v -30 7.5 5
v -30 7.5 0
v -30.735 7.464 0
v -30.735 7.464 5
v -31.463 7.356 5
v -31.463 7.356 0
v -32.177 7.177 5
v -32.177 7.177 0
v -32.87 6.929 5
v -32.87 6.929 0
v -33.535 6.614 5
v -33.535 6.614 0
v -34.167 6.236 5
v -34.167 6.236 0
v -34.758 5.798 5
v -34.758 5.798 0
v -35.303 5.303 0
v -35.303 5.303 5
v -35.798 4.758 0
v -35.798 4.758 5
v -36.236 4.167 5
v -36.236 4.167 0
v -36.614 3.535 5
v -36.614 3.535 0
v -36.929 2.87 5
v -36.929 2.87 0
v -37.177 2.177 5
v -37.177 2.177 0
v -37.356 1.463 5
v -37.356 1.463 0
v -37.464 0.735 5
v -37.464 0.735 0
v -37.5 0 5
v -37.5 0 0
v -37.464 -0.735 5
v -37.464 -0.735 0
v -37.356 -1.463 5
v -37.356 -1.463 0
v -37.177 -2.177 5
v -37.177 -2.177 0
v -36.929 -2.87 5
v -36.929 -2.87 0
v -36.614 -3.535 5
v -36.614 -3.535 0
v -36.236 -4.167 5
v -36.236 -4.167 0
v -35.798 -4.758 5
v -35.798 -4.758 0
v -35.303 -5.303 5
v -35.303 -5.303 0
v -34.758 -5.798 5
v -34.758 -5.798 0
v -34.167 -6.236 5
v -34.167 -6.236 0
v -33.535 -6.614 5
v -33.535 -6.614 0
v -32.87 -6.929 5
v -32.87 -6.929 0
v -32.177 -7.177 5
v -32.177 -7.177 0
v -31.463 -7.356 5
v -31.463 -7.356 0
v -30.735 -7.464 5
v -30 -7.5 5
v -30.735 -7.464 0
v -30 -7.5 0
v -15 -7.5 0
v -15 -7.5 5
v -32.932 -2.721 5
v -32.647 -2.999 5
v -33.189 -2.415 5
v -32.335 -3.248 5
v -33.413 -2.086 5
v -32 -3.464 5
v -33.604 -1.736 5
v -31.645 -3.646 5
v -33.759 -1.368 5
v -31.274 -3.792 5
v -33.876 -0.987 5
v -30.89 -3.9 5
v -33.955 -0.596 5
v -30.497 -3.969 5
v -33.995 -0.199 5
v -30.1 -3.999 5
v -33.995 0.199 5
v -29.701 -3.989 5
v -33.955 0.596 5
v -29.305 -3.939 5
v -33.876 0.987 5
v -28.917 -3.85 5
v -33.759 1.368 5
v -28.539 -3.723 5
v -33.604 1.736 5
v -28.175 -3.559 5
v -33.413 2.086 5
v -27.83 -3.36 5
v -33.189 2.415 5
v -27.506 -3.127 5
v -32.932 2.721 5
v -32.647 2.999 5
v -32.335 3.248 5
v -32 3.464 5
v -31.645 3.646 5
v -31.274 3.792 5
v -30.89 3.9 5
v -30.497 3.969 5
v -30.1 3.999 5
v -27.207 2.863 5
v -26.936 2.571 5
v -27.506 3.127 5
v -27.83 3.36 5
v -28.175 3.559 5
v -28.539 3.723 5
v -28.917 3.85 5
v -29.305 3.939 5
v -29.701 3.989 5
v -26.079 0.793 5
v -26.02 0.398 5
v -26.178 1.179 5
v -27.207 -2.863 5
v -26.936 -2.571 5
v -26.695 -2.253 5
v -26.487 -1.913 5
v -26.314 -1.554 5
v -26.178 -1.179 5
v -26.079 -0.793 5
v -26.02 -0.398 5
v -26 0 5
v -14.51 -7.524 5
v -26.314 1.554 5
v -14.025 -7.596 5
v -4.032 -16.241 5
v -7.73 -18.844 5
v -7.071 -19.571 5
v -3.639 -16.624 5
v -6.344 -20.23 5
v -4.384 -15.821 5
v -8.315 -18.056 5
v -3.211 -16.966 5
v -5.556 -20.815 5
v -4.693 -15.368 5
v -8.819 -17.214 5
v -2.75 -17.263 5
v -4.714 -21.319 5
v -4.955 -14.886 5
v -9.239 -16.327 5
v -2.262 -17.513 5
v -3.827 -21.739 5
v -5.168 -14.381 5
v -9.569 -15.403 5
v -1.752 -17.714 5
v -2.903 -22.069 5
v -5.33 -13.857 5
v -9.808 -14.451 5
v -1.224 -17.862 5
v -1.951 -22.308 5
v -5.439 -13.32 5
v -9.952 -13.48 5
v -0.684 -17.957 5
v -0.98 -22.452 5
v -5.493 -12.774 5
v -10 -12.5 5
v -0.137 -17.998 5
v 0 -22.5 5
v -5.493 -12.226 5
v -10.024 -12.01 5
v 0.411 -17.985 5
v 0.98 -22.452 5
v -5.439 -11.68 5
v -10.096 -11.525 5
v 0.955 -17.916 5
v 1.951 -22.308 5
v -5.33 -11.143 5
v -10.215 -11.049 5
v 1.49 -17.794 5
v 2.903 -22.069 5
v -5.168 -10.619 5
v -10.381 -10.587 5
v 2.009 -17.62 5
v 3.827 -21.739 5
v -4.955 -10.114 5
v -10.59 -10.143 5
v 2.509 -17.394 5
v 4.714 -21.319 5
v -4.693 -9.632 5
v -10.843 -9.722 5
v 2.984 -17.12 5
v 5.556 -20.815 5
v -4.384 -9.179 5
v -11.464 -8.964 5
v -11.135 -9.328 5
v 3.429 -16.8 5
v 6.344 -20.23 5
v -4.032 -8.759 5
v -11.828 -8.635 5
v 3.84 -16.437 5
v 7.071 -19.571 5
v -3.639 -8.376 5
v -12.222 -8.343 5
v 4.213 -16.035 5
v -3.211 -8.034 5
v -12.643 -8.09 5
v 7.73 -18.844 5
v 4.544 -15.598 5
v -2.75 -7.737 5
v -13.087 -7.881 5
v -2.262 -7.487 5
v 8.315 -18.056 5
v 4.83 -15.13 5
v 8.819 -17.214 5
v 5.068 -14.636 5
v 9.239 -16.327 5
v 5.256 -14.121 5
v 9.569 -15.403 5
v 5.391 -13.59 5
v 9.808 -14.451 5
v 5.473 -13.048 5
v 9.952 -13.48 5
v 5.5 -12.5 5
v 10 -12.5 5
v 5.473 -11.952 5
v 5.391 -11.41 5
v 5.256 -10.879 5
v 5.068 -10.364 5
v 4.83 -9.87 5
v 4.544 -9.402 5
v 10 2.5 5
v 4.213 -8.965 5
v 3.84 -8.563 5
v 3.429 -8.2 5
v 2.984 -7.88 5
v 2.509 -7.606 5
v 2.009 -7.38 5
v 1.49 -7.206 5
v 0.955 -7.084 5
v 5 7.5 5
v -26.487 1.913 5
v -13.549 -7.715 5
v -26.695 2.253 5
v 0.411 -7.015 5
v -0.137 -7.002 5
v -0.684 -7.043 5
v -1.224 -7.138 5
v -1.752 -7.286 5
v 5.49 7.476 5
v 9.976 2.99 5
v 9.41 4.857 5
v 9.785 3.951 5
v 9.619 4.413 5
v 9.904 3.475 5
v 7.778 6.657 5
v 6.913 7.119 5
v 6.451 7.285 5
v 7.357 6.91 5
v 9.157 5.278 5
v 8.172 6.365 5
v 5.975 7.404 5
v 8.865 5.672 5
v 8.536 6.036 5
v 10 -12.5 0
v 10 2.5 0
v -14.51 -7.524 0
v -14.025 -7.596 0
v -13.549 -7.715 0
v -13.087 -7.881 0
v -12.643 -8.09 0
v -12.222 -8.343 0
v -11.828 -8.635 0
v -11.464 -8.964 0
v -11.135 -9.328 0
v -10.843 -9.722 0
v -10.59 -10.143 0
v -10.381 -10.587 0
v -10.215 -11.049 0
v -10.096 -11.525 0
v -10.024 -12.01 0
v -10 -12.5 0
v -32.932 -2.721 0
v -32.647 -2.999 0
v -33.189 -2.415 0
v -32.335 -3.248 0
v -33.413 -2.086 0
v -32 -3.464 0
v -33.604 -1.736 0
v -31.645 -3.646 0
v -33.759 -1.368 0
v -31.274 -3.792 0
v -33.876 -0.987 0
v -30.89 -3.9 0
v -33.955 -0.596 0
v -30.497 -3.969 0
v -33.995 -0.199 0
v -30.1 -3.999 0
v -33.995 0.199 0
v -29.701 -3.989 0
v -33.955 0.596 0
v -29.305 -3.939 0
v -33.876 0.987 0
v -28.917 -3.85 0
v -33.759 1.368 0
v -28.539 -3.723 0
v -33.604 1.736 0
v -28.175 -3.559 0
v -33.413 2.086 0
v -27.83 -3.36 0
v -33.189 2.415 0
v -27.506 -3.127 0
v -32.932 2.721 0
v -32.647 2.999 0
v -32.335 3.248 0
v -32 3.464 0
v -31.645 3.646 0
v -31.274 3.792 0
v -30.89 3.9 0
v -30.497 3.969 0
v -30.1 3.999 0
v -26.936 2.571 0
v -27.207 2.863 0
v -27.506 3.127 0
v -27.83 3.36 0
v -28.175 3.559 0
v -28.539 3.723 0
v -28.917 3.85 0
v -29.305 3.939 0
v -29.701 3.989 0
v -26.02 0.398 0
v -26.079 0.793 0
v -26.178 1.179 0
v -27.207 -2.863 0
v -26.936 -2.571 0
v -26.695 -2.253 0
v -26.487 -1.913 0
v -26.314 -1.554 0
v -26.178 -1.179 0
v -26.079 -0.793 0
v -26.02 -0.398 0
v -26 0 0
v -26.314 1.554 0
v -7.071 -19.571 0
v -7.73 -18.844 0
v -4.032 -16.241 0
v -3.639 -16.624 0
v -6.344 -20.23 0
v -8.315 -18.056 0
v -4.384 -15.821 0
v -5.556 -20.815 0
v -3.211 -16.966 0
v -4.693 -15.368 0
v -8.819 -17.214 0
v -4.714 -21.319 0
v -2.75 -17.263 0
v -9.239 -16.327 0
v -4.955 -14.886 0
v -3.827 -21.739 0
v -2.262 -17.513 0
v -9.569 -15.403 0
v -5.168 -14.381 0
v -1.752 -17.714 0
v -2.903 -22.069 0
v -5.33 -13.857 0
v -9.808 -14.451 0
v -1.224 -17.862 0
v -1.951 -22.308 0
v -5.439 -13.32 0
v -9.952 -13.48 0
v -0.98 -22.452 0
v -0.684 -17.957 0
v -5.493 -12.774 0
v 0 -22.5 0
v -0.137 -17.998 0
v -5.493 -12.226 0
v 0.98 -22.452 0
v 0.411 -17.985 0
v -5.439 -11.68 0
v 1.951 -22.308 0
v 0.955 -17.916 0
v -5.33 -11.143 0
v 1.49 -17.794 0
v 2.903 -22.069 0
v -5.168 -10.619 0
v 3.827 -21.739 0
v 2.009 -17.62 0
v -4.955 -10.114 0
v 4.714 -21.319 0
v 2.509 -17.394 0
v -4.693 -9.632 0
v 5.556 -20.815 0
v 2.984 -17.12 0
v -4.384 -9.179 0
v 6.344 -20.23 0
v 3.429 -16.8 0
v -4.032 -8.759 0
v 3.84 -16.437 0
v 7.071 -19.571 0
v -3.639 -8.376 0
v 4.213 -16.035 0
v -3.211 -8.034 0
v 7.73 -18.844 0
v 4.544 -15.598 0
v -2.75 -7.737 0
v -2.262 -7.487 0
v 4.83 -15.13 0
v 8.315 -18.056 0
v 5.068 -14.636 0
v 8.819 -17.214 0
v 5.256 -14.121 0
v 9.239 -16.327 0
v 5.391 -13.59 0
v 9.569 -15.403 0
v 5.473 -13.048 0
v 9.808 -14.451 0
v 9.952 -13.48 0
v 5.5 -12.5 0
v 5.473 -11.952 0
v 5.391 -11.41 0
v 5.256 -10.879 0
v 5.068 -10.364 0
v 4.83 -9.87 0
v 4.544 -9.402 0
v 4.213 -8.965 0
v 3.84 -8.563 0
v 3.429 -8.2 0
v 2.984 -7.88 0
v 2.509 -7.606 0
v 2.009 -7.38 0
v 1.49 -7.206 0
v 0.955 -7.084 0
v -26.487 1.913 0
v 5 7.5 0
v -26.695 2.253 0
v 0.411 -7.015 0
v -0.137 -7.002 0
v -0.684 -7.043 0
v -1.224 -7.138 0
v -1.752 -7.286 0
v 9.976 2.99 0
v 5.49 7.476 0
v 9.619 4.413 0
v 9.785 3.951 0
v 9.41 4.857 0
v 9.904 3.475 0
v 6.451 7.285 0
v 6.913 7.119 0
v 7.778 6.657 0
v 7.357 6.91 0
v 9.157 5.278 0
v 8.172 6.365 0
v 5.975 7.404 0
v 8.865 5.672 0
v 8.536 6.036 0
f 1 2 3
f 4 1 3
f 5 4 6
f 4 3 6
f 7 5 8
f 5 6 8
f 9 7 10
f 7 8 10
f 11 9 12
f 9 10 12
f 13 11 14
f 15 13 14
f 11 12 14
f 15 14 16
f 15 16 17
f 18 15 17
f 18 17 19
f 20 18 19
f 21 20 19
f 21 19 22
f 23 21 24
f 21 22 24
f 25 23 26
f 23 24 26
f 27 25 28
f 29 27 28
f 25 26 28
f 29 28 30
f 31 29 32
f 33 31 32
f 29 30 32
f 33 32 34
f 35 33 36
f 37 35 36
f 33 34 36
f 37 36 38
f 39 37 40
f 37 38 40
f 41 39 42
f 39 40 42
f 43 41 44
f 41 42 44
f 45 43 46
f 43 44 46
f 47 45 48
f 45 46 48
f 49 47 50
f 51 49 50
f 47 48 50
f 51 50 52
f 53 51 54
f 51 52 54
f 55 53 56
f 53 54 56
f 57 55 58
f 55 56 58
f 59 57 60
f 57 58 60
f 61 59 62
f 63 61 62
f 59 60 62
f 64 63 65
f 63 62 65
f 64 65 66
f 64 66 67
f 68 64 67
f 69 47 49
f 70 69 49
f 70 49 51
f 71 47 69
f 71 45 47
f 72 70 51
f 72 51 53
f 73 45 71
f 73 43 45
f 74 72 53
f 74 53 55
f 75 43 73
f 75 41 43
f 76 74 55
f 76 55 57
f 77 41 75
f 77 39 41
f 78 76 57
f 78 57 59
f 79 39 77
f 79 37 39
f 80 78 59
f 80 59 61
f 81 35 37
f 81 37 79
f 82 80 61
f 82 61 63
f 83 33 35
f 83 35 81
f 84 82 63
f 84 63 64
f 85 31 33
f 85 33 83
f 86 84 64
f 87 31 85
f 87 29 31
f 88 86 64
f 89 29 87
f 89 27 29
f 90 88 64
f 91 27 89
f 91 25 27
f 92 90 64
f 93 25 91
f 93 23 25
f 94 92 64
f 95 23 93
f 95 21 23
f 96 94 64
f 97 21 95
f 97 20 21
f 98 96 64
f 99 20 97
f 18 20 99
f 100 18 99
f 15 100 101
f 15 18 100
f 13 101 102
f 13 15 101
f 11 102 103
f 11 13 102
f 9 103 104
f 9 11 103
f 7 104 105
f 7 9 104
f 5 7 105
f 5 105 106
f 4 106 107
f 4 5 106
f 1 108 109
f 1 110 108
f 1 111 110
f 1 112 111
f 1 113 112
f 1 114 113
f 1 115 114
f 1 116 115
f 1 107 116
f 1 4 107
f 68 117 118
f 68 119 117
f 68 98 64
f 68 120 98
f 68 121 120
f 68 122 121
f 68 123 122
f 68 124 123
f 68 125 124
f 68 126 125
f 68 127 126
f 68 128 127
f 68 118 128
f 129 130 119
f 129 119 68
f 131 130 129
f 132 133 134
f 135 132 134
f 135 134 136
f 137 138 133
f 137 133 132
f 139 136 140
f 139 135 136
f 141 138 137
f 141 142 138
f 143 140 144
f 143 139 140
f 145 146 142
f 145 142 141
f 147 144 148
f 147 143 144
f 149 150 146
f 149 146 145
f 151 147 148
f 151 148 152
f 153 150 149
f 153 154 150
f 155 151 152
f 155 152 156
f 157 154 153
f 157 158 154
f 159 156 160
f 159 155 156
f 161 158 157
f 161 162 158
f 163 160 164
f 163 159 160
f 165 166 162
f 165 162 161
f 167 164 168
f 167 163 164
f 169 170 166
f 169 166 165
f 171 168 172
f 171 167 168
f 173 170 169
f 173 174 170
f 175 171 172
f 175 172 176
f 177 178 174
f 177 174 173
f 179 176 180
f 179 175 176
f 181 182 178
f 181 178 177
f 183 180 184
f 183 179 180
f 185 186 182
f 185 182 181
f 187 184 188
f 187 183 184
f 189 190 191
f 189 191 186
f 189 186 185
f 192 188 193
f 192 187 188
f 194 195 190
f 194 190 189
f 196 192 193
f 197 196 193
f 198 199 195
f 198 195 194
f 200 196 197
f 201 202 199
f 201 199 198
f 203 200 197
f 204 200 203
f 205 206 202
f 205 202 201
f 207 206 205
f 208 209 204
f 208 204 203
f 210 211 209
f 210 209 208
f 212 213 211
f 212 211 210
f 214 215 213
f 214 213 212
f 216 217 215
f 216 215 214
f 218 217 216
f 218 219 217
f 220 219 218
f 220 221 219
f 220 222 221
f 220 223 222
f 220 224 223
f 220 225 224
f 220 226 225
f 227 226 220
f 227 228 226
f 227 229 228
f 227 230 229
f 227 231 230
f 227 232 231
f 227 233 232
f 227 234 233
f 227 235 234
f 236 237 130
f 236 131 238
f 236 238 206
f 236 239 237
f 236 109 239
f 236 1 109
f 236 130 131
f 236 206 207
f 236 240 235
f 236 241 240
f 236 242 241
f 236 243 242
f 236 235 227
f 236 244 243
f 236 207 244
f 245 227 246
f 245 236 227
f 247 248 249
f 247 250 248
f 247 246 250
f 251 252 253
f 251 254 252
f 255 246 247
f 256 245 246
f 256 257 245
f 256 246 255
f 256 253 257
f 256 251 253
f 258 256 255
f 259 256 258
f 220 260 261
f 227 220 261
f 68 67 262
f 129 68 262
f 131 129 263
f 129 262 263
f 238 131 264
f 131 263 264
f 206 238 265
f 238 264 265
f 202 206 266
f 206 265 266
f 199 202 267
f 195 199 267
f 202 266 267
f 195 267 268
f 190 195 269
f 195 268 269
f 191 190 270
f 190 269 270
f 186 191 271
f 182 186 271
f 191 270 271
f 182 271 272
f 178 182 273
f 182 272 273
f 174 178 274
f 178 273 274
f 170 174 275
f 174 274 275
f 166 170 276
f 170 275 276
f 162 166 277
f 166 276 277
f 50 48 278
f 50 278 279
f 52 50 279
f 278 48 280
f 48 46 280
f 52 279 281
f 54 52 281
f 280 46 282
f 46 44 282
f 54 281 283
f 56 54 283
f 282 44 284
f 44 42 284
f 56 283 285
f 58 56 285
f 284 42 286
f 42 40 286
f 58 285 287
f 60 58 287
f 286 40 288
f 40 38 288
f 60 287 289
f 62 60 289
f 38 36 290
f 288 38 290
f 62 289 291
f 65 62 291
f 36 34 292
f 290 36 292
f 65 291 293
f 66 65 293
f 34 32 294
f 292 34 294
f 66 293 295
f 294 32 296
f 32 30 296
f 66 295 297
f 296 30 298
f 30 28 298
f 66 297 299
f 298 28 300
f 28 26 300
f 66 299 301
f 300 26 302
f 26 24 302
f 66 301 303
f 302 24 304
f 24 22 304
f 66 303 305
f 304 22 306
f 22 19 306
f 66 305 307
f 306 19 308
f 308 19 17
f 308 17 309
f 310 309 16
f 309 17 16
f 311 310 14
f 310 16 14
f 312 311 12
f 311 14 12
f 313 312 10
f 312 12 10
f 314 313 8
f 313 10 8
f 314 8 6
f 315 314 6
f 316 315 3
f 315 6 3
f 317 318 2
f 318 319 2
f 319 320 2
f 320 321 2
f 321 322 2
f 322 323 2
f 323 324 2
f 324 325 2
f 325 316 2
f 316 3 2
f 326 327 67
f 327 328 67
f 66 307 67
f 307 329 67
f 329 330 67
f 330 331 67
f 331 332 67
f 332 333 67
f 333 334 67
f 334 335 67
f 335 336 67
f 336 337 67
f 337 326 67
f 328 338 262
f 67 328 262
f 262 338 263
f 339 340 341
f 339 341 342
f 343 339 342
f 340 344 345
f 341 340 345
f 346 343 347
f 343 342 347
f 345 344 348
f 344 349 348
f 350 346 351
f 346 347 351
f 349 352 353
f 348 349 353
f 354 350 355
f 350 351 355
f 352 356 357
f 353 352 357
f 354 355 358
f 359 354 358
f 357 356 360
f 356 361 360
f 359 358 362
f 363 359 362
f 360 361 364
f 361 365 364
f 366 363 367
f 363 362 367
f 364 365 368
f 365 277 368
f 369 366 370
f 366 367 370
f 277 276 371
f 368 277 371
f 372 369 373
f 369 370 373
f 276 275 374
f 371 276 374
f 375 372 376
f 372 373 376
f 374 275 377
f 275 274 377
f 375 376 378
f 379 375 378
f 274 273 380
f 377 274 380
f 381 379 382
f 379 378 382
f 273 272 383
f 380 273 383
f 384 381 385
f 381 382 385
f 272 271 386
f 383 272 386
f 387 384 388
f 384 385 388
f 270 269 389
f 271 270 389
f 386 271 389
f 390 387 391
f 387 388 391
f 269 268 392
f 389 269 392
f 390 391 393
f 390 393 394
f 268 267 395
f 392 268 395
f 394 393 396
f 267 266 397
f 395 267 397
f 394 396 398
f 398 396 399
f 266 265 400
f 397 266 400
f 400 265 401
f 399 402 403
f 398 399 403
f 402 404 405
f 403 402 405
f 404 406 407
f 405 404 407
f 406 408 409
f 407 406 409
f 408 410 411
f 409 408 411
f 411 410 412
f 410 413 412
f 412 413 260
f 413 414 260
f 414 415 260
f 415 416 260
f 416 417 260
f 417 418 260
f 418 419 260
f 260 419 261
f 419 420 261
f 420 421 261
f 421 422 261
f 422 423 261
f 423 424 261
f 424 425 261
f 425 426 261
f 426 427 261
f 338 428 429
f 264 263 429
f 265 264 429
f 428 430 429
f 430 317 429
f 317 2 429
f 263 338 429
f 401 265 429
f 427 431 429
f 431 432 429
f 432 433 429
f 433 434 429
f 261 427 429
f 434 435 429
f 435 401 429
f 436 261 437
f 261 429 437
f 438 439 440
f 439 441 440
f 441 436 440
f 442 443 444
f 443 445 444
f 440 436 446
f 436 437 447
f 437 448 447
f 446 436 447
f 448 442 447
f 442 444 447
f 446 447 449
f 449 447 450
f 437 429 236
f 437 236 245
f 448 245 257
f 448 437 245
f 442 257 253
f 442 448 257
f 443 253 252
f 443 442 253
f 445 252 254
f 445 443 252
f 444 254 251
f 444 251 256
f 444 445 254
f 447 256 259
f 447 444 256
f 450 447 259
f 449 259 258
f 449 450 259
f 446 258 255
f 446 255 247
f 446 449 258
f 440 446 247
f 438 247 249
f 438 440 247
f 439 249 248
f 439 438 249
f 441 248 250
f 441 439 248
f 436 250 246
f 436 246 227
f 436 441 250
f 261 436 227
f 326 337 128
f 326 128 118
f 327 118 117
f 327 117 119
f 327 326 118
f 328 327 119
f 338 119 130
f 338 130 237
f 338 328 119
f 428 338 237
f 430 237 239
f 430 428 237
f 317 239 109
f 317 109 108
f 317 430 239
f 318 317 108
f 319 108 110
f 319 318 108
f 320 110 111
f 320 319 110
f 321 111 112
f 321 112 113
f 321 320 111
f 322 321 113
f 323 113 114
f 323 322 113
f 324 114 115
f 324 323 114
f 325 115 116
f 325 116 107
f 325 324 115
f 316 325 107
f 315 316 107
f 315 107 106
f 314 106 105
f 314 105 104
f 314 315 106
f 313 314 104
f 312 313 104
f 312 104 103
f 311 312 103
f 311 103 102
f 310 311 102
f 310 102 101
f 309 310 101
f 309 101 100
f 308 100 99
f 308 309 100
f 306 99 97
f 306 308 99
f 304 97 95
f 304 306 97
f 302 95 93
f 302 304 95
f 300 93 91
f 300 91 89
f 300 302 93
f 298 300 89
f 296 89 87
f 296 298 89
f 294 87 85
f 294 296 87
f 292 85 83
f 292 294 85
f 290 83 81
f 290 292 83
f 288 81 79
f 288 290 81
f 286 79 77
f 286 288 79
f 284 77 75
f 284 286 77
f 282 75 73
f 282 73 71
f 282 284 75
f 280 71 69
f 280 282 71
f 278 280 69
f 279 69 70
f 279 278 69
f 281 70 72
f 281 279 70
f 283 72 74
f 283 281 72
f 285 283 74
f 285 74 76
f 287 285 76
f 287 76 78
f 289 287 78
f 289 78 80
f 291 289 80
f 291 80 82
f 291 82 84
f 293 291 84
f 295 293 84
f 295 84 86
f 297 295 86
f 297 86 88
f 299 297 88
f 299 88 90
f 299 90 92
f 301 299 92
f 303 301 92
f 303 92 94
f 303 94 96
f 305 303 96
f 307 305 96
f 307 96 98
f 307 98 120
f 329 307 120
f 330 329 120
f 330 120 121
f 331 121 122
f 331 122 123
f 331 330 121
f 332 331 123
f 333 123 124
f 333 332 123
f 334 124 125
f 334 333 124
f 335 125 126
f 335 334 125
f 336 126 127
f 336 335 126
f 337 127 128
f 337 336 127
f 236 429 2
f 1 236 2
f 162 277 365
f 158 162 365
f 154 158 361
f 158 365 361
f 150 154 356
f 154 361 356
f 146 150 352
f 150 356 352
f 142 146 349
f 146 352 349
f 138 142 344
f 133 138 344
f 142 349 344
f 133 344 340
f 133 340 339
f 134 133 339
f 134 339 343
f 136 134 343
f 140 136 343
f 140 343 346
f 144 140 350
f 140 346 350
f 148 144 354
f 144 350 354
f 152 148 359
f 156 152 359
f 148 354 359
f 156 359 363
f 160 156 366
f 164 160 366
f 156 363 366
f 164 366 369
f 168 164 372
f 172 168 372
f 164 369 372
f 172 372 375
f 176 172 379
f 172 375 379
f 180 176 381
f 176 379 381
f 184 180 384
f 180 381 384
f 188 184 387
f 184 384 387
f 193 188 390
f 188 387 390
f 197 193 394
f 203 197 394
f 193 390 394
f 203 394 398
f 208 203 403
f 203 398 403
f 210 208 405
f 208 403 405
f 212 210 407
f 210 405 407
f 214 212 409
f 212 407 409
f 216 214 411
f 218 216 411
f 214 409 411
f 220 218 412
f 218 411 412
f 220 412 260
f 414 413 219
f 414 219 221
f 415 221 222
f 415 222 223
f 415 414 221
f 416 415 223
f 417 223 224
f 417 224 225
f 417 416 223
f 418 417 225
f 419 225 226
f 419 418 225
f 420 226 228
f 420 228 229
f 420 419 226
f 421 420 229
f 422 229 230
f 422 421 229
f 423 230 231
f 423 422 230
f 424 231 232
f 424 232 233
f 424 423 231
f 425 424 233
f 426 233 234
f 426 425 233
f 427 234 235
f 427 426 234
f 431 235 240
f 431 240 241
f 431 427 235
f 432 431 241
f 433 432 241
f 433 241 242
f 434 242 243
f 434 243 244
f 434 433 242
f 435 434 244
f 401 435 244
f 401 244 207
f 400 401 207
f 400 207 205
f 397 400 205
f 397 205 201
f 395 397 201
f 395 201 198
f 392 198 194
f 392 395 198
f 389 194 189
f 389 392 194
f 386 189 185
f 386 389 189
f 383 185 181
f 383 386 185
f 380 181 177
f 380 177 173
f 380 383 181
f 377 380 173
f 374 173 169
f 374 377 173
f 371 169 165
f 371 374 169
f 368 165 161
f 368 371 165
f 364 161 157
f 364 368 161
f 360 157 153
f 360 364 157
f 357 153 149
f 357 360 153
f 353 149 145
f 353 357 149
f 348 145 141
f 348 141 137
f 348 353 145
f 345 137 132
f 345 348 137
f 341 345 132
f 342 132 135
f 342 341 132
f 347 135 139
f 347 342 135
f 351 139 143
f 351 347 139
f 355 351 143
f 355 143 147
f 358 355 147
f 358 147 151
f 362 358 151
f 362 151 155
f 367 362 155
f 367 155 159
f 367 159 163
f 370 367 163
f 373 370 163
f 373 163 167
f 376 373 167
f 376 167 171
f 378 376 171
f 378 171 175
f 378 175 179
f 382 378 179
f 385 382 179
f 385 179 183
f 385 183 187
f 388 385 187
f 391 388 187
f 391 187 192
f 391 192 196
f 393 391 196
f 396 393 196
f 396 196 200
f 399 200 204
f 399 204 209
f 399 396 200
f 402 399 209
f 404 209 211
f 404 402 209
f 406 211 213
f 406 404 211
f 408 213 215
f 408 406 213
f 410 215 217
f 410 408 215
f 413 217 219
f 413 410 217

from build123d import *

# Parameters (mm, degrees)
SKETCH_1_R       = 4
SKETCH_1_R_2     = 5.5
EXTRUDE_1_DEPTH  = 5
FILLET_1_DEPTH   = 5
FILLET_1_2_DEPTH = 5


with BuildPart() as part:
    # 草图1 → 凸台-拉伸1 (new body)
    with BuildSketch(Plane.XY):
        with BuildLine():
            Line((-30, -7.5), (-10, -7.5))
            Line((-10, -7.5), (-10, -12.5))
            ThreePointArc((-10, -12.5), (0, -22.5), (10, -12.5))
            Line((10, -12.5), (10, 7.5))
            Line((10, 7.5), (-30, 7.5))
            ThreePointArc((-30, 7.5), (-37.5, 0), (-30, -7.5))
        make_face()
        with Locations((-30, 0)):
            Circle(SKETCH_1_R, mode=Mode.SUBTRACT)
        with Locations((0, -12.5)):
            Circle(SKETCH_1_R_2, mode=Mode.SUBTRACT)
    extrude(amount=EXTRUDE_1_DEPTH)

    # 圆角1: read off the stored shape, not the designer's step
    # 圆角1 outline → 圆角1 (cut)
    with BuildSketch(Plane.XY):
        with BuildLine():
            Line((10, 7.5), (5, 7.5))
            ThreePointArc((5, 7.5), (8.535533906, 6.035533906), (10, 2.5))
            Line((10, 2.5), (10, 7.5))
        make_face()
    extrude(amount=FILLET_1_DEPTH, mode=Mode.SUBTRACT)

    # Fillet 1 2 outline → Fillet 1 2 (add)
    with BuildSketch(Plane.XY):
        with BuildLine():
            ThreePointArc((-15, -7.5), (-11.464466094, -8.964466094), (-10, -12.5))
            Line((-10, -12.5), (-10, -7.5))
            Line((-10, -7.5), (-15, -7.5))
        make_face()
    extrude(amount=FILLET_1_2_DEPTH)


solid = part.part
